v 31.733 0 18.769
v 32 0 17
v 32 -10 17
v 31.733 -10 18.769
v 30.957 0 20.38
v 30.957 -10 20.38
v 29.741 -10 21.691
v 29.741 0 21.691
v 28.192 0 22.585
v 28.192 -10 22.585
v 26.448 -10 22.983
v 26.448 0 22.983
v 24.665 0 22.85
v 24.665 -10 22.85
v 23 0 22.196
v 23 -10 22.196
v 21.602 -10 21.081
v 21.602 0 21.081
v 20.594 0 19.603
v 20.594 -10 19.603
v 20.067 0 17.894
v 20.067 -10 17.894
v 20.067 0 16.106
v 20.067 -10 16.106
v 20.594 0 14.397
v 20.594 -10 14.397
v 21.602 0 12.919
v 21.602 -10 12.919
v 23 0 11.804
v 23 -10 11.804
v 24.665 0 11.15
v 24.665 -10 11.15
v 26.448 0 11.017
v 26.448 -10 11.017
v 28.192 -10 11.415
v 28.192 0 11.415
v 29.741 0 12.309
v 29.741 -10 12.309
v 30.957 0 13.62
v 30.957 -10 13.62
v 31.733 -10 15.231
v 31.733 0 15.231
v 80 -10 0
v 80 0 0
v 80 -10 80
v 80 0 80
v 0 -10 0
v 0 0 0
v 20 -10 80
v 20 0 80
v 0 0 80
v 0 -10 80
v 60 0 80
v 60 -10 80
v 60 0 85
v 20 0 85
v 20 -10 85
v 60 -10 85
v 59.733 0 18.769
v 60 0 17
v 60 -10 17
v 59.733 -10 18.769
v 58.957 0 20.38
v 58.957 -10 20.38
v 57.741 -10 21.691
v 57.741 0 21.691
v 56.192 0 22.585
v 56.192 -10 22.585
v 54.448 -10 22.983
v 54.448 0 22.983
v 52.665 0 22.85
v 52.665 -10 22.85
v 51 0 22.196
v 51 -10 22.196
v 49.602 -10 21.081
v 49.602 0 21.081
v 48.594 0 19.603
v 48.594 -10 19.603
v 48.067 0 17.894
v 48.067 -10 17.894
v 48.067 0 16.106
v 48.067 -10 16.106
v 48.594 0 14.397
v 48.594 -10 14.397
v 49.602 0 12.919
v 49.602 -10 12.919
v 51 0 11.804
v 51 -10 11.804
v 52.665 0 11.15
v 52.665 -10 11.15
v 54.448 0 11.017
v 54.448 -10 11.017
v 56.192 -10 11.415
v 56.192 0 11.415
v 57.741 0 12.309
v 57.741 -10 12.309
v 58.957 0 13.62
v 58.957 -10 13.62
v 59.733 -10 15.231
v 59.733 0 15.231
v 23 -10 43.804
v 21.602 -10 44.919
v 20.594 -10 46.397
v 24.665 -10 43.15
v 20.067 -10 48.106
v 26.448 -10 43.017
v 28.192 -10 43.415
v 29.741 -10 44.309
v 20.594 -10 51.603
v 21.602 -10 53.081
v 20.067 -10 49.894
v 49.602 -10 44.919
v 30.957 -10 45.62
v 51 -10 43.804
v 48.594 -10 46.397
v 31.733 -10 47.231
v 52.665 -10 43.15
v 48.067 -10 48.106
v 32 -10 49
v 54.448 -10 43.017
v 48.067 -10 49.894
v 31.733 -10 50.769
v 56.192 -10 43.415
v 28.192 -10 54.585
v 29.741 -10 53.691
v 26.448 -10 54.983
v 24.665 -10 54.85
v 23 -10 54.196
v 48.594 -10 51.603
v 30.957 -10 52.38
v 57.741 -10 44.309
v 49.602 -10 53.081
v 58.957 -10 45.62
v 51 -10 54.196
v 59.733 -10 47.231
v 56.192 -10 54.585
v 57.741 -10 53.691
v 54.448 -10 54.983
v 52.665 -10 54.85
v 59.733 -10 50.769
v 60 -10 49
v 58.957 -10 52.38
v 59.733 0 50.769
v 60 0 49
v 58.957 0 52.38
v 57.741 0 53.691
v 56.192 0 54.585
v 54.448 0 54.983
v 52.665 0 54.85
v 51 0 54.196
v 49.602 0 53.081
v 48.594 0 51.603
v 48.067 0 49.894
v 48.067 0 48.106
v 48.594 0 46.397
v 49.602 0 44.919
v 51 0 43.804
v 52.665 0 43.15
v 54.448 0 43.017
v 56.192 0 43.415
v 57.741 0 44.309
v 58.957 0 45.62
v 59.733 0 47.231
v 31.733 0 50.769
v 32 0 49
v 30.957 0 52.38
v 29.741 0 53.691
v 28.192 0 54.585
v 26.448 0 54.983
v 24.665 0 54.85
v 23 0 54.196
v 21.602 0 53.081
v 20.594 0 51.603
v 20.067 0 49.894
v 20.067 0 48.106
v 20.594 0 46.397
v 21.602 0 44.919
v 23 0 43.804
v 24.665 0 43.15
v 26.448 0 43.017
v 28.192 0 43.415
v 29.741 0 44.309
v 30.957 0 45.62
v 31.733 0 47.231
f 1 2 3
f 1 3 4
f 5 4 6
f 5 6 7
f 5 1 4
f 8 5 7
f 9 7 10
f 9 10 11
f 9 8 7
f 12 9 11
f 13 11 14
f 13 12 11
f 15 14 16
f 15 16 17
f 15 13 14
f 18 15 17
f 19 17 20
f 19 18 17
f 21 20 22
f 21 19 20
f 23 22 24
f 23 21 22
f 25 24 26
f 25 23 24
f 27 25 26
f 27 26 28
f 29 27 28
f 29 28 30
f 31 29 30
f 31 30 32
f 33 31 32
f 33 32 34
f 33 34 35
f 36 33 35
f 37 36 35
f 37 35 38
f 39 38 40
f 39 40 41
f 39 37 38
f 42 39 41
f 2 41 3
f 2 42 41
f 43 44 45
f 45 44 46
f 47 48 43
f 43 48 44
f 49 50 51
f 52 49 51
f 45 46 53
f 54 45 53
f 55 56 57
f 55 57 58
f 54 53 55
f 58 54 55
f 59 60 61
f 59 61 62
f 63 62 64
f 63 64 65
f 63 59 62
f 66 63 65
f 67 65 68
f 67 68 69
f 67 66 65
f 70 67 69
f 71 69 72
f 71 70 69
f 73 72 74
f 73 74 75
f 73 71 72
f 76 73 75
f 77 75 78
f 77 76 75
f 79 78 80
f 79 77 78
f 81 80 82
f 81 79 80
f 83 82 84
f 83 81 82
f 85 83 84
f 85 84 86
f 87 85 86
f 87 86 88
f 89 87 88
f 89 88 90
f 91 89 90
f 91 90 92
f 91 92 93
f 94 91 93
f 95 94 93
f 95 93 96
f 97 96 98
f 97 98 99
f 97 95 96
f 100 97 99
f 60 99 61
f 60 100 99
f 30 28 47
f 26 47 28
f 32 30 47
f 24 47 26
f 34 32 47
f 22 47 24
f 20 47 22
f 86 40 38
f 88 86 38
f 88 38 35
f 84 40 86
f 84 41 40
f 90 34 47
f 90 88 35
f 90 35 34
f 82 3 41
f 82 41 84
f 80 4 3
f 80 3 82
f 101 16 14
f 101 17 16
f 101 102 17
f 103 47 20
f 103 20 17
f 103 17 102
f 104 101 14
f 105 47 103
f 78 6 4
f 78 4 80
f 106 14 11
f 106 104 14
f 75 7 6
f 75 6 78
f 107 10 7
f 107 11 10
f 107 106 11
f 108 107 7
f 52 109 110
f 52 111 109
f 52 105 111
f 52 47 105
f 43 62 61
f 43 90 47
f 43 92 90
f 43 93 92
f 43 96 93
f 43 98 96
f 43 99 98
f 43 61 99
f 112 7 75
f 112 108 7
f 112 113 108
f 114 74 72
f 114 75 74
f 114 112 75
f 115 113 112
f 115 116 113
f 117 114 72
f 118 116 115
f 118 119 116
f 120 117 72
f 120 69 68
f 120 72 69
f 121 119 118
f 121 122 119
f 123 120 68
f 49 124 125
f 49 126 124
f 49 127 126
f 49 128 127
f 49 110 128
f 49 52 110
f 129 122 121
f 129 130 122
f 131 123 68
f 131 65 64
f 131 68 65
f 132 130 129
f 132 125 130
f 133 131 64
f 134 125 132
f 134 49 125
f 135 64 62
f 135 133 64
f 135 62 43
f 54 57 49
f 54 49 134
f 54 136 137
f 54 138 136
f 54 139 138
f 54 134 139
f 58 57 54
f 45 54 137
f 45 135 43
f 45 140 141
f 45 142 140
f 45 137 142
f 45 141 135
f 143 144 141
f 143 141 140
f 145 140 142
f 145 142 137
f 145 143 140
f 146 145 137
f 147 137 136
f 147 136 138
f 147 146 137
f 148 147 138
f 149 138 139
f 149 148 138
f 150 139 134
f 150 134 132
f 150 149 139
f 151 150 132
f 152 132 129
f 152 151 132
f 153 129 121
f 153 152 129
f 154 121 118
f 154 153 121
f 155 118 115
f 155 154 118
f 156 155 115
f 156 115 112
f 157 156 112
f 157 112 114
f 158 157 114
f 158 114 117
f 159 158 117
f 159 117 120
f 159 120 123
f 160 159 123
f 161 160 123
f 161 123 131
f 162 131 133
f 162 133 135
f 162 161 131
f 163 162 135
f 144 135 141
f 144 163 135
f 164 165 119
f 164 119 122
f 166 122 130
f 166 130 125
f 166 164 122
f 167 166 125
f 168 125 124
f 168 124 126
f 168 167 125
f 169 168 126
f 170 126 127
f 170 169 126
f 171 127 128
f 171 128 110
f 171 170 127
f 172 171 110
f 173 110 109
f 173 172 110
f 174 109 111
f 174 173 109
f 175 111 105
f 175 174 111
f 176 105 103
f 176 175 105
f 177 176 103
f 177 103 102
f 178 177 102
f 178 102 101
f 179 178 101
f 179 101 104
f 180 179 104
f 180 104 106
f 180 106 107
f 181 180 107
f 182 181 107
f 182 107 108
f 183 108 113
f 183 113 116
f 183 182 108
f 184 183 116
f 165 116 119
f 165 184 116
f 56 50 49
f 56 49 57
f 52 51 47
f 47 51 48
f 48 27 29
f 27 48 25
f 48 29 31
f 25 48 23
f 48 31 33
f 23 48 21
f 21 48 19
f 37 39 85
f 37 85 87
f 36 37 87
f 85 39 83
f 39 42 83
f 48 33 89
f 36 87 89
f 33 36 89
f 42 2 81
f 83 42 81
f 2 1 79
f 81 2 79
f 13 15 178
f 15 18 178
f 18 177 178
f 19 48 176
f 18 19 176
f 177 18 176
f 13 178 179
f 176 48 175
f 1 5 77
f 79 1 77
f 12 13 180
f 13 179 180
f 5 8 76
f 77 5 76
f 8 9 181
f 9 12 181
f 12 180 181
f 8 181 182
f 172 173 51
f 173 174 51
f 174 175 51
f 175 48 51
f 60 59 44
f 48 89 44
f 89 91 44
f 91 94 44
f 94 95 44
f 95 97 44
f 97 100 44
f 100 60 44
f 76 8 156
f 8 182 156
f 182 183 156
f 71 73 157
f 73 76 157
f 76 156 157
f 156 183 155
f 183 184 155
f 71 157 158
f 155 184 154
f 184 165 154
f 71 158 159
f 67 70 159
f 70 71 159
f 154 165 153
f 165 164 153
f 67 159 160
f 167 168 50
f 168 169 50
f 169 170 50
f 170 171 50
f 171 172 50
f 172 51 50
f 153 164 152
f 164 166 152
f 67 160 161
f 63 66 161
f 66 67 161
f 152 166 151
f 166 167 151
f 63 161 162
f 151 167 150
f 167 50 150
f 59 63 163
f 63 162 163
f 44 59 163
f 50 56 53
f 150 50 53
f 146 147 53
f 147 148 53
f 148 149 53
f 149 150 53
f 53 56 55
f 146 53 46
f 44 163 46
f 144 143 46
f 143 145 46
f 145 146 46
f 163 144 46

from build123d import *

# Parameters (mm, degrees)
F0_R     = 6
F0_W     = 40
F0_H     = 5
F1_DEPTH = 10


with BuildPart() as f1:
    # F0 (on Front) → F1 (new body)
    with BuildSketch(Plane.XZ):
        Polygon((0, 80), (0, 0), (80, 0), (80, 80), (60, 80), (20, 80), align=None)
        with Locations((26, 17)):
            Circle(F0_R, mode=Mode.SUBTRACT)
        with Locations((54, 17)):
            Circle(F0_R, mode=Mode.SUBTRACT)
        with Locations((26, 49)):
            Circle(F0_R, mode=Mode.SUBTRACT)
        with Locations((54, 49)):
            Circle(F0_R, mode=Mode.SUBTRACT)
        with Locations((40, 82.5)):
            Rectangle(F0_W, F0_H)
    extrude(amount=F1_DEPTH)


solid = f1.part
